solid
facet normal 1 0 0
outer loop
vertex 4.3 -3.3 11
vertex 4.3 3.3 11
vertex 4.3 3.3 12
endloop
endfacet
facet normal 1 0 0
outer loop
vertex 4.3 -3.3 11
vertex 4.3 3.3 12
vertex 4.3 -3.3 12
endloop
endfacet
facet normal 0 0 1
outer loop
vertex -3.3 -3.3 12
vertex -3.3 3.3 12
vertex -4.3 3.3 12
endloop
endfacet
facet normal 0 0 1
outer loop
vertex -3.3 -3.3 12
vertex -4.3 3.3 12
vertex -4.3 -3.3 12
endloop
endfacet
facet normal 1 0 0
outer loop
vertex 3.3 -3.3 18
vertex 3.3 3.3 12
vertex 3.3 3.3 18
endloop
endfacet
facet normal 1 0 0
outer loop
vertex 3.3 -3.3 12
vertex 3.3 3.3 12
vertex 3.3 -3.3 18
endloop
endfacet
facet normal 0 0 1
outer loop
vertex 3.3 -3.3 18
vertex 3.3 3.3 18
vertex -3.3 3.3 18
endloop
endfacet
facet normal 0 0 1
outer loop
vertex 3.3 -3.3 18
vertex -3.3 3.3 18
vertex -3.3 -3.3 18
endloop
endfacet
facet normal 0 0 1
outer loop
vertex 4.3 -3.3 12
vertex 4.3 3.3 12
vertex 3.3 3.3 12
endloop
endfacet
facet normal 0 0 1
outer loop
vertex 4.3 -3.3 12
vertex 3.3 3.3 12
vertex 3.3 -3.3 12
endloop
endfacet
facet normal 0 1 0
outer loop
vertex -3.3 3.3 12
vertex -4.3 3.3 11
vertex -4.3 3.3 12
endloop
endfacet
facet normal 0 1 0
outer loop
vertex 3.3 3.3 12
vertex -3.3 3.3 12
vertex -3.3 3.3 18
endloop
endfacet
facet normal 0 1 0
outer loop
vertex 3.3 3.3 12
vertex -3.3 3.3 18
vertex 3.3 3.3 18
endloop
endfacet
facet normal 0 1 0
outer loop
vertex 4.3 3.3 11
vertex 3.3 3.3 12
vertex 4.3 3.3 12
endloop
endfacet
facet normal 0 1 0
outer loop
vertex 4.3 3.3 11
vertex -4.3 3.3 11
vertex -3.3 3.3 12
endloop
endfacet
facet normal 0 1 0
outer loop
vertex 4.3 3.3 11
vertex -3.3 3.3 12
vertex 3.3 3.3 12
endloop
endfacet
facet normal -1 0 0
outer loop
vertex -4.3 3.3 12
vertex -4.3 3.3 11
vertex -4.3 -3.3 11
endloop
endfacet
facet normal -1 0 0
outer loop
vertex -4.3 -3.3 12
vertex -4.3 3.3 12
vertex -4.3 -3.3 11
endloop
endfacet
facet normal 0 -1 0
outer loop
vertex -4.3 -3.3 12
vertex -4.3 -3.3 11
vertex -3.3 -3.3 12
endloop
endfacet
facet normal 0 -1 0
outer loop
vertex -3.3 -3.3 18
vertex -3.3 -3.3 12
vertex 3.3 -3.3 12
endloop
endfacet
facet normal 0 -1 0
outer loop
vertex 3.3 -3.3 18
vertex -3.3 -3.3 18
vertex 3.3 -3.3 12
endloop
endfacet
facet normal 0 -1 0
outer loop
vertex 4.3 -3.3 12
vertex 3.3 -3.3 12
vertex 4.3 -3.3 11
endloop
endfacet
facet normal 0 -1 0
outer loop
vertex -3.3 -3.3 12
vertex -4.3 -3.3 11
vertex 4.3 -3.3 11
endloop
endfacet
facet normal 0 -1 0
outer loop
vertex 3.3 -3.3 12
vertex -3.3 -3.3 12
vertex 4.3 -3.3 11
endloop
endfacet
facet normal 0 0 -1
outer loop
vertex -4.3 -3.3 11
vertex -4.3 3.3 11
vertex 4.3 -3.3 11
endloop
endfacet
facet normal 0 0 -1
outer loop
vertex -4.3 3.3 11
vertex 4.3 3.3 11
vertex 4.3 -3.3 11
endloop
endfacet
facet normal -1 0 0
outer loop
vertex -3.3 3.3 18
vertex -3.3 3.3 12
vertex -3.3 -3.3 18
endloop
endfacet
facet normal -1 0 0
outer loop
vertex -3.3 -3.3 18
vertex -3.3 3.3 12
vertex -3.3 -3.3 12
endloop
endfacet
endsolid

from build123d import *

# Parameters (mm, degrees)
BOX085_W               = 3.5
BOX085_H               = 2.5
BOX085_DEPTH           = 4.5
BOX083_W               = 6.6
BOX083_H               = 8.6
BOX083_DEPTH           = 1
BOX084_W               = 6.6
BOX084_H               = 6.6
BOX084_DEPTH           = 7
CUT022_PLACEMENT_ANGLE = 90


with BuildPart() as sub_cap:
    # Box085 → Box085 (new body)
    with BuildSketch(Plane(origin=(-1.75, -1.25, 0), x_dir=(1, 0, 0), z_dir=(0, 0, 1))):
        with Locations((1.75, 1.25)):
            Rectangle(BOX085_W, BOX085_H)
    extrude(amount=BOX085_DEPTH)


with BuildPart() as cap:
    # Box083 → Box083 (new body)
    with BuildSketch(Plane(origin=(-3.3, -4.3, 11), x_dir=(1, 0, 0), z_dir=(0, 0, 1))):
        with Locations((3.3, 4.3)):
            Rectangle(BOX083_W, BOX083_H)
    extrude(amount=BOX083_DEPTH)


with BuildPart() as switch_cap_master:
    # Box084 → Box084 (new body)
    with BuildSketch(Plane(origin=(-3.3, -3.3, 11), x_dir=(1, 0, 0), z_dir=(0, 0, 1))):
        with Locations((3.3, 3.3)):
            Rectangle(BOX084_W, BOX084_H)
    extrude(amount=BOX084_DEPTH)

    # Fusion023: union cap
    add(cap.part)

    # Cut022: cut sub cap
    add(sub_cap.part, mode=Mode.SUBTRACT)


with BuildPart() as switch_cap_master_1:
    # Cut022 placement: moved
    add(switch_cap_master.part.rotate(Axis((0, 0, 0), (0, 0, -1)), CUT022_PLACEMENT_ANGLE))


solid = switch_cap_master_1.part
